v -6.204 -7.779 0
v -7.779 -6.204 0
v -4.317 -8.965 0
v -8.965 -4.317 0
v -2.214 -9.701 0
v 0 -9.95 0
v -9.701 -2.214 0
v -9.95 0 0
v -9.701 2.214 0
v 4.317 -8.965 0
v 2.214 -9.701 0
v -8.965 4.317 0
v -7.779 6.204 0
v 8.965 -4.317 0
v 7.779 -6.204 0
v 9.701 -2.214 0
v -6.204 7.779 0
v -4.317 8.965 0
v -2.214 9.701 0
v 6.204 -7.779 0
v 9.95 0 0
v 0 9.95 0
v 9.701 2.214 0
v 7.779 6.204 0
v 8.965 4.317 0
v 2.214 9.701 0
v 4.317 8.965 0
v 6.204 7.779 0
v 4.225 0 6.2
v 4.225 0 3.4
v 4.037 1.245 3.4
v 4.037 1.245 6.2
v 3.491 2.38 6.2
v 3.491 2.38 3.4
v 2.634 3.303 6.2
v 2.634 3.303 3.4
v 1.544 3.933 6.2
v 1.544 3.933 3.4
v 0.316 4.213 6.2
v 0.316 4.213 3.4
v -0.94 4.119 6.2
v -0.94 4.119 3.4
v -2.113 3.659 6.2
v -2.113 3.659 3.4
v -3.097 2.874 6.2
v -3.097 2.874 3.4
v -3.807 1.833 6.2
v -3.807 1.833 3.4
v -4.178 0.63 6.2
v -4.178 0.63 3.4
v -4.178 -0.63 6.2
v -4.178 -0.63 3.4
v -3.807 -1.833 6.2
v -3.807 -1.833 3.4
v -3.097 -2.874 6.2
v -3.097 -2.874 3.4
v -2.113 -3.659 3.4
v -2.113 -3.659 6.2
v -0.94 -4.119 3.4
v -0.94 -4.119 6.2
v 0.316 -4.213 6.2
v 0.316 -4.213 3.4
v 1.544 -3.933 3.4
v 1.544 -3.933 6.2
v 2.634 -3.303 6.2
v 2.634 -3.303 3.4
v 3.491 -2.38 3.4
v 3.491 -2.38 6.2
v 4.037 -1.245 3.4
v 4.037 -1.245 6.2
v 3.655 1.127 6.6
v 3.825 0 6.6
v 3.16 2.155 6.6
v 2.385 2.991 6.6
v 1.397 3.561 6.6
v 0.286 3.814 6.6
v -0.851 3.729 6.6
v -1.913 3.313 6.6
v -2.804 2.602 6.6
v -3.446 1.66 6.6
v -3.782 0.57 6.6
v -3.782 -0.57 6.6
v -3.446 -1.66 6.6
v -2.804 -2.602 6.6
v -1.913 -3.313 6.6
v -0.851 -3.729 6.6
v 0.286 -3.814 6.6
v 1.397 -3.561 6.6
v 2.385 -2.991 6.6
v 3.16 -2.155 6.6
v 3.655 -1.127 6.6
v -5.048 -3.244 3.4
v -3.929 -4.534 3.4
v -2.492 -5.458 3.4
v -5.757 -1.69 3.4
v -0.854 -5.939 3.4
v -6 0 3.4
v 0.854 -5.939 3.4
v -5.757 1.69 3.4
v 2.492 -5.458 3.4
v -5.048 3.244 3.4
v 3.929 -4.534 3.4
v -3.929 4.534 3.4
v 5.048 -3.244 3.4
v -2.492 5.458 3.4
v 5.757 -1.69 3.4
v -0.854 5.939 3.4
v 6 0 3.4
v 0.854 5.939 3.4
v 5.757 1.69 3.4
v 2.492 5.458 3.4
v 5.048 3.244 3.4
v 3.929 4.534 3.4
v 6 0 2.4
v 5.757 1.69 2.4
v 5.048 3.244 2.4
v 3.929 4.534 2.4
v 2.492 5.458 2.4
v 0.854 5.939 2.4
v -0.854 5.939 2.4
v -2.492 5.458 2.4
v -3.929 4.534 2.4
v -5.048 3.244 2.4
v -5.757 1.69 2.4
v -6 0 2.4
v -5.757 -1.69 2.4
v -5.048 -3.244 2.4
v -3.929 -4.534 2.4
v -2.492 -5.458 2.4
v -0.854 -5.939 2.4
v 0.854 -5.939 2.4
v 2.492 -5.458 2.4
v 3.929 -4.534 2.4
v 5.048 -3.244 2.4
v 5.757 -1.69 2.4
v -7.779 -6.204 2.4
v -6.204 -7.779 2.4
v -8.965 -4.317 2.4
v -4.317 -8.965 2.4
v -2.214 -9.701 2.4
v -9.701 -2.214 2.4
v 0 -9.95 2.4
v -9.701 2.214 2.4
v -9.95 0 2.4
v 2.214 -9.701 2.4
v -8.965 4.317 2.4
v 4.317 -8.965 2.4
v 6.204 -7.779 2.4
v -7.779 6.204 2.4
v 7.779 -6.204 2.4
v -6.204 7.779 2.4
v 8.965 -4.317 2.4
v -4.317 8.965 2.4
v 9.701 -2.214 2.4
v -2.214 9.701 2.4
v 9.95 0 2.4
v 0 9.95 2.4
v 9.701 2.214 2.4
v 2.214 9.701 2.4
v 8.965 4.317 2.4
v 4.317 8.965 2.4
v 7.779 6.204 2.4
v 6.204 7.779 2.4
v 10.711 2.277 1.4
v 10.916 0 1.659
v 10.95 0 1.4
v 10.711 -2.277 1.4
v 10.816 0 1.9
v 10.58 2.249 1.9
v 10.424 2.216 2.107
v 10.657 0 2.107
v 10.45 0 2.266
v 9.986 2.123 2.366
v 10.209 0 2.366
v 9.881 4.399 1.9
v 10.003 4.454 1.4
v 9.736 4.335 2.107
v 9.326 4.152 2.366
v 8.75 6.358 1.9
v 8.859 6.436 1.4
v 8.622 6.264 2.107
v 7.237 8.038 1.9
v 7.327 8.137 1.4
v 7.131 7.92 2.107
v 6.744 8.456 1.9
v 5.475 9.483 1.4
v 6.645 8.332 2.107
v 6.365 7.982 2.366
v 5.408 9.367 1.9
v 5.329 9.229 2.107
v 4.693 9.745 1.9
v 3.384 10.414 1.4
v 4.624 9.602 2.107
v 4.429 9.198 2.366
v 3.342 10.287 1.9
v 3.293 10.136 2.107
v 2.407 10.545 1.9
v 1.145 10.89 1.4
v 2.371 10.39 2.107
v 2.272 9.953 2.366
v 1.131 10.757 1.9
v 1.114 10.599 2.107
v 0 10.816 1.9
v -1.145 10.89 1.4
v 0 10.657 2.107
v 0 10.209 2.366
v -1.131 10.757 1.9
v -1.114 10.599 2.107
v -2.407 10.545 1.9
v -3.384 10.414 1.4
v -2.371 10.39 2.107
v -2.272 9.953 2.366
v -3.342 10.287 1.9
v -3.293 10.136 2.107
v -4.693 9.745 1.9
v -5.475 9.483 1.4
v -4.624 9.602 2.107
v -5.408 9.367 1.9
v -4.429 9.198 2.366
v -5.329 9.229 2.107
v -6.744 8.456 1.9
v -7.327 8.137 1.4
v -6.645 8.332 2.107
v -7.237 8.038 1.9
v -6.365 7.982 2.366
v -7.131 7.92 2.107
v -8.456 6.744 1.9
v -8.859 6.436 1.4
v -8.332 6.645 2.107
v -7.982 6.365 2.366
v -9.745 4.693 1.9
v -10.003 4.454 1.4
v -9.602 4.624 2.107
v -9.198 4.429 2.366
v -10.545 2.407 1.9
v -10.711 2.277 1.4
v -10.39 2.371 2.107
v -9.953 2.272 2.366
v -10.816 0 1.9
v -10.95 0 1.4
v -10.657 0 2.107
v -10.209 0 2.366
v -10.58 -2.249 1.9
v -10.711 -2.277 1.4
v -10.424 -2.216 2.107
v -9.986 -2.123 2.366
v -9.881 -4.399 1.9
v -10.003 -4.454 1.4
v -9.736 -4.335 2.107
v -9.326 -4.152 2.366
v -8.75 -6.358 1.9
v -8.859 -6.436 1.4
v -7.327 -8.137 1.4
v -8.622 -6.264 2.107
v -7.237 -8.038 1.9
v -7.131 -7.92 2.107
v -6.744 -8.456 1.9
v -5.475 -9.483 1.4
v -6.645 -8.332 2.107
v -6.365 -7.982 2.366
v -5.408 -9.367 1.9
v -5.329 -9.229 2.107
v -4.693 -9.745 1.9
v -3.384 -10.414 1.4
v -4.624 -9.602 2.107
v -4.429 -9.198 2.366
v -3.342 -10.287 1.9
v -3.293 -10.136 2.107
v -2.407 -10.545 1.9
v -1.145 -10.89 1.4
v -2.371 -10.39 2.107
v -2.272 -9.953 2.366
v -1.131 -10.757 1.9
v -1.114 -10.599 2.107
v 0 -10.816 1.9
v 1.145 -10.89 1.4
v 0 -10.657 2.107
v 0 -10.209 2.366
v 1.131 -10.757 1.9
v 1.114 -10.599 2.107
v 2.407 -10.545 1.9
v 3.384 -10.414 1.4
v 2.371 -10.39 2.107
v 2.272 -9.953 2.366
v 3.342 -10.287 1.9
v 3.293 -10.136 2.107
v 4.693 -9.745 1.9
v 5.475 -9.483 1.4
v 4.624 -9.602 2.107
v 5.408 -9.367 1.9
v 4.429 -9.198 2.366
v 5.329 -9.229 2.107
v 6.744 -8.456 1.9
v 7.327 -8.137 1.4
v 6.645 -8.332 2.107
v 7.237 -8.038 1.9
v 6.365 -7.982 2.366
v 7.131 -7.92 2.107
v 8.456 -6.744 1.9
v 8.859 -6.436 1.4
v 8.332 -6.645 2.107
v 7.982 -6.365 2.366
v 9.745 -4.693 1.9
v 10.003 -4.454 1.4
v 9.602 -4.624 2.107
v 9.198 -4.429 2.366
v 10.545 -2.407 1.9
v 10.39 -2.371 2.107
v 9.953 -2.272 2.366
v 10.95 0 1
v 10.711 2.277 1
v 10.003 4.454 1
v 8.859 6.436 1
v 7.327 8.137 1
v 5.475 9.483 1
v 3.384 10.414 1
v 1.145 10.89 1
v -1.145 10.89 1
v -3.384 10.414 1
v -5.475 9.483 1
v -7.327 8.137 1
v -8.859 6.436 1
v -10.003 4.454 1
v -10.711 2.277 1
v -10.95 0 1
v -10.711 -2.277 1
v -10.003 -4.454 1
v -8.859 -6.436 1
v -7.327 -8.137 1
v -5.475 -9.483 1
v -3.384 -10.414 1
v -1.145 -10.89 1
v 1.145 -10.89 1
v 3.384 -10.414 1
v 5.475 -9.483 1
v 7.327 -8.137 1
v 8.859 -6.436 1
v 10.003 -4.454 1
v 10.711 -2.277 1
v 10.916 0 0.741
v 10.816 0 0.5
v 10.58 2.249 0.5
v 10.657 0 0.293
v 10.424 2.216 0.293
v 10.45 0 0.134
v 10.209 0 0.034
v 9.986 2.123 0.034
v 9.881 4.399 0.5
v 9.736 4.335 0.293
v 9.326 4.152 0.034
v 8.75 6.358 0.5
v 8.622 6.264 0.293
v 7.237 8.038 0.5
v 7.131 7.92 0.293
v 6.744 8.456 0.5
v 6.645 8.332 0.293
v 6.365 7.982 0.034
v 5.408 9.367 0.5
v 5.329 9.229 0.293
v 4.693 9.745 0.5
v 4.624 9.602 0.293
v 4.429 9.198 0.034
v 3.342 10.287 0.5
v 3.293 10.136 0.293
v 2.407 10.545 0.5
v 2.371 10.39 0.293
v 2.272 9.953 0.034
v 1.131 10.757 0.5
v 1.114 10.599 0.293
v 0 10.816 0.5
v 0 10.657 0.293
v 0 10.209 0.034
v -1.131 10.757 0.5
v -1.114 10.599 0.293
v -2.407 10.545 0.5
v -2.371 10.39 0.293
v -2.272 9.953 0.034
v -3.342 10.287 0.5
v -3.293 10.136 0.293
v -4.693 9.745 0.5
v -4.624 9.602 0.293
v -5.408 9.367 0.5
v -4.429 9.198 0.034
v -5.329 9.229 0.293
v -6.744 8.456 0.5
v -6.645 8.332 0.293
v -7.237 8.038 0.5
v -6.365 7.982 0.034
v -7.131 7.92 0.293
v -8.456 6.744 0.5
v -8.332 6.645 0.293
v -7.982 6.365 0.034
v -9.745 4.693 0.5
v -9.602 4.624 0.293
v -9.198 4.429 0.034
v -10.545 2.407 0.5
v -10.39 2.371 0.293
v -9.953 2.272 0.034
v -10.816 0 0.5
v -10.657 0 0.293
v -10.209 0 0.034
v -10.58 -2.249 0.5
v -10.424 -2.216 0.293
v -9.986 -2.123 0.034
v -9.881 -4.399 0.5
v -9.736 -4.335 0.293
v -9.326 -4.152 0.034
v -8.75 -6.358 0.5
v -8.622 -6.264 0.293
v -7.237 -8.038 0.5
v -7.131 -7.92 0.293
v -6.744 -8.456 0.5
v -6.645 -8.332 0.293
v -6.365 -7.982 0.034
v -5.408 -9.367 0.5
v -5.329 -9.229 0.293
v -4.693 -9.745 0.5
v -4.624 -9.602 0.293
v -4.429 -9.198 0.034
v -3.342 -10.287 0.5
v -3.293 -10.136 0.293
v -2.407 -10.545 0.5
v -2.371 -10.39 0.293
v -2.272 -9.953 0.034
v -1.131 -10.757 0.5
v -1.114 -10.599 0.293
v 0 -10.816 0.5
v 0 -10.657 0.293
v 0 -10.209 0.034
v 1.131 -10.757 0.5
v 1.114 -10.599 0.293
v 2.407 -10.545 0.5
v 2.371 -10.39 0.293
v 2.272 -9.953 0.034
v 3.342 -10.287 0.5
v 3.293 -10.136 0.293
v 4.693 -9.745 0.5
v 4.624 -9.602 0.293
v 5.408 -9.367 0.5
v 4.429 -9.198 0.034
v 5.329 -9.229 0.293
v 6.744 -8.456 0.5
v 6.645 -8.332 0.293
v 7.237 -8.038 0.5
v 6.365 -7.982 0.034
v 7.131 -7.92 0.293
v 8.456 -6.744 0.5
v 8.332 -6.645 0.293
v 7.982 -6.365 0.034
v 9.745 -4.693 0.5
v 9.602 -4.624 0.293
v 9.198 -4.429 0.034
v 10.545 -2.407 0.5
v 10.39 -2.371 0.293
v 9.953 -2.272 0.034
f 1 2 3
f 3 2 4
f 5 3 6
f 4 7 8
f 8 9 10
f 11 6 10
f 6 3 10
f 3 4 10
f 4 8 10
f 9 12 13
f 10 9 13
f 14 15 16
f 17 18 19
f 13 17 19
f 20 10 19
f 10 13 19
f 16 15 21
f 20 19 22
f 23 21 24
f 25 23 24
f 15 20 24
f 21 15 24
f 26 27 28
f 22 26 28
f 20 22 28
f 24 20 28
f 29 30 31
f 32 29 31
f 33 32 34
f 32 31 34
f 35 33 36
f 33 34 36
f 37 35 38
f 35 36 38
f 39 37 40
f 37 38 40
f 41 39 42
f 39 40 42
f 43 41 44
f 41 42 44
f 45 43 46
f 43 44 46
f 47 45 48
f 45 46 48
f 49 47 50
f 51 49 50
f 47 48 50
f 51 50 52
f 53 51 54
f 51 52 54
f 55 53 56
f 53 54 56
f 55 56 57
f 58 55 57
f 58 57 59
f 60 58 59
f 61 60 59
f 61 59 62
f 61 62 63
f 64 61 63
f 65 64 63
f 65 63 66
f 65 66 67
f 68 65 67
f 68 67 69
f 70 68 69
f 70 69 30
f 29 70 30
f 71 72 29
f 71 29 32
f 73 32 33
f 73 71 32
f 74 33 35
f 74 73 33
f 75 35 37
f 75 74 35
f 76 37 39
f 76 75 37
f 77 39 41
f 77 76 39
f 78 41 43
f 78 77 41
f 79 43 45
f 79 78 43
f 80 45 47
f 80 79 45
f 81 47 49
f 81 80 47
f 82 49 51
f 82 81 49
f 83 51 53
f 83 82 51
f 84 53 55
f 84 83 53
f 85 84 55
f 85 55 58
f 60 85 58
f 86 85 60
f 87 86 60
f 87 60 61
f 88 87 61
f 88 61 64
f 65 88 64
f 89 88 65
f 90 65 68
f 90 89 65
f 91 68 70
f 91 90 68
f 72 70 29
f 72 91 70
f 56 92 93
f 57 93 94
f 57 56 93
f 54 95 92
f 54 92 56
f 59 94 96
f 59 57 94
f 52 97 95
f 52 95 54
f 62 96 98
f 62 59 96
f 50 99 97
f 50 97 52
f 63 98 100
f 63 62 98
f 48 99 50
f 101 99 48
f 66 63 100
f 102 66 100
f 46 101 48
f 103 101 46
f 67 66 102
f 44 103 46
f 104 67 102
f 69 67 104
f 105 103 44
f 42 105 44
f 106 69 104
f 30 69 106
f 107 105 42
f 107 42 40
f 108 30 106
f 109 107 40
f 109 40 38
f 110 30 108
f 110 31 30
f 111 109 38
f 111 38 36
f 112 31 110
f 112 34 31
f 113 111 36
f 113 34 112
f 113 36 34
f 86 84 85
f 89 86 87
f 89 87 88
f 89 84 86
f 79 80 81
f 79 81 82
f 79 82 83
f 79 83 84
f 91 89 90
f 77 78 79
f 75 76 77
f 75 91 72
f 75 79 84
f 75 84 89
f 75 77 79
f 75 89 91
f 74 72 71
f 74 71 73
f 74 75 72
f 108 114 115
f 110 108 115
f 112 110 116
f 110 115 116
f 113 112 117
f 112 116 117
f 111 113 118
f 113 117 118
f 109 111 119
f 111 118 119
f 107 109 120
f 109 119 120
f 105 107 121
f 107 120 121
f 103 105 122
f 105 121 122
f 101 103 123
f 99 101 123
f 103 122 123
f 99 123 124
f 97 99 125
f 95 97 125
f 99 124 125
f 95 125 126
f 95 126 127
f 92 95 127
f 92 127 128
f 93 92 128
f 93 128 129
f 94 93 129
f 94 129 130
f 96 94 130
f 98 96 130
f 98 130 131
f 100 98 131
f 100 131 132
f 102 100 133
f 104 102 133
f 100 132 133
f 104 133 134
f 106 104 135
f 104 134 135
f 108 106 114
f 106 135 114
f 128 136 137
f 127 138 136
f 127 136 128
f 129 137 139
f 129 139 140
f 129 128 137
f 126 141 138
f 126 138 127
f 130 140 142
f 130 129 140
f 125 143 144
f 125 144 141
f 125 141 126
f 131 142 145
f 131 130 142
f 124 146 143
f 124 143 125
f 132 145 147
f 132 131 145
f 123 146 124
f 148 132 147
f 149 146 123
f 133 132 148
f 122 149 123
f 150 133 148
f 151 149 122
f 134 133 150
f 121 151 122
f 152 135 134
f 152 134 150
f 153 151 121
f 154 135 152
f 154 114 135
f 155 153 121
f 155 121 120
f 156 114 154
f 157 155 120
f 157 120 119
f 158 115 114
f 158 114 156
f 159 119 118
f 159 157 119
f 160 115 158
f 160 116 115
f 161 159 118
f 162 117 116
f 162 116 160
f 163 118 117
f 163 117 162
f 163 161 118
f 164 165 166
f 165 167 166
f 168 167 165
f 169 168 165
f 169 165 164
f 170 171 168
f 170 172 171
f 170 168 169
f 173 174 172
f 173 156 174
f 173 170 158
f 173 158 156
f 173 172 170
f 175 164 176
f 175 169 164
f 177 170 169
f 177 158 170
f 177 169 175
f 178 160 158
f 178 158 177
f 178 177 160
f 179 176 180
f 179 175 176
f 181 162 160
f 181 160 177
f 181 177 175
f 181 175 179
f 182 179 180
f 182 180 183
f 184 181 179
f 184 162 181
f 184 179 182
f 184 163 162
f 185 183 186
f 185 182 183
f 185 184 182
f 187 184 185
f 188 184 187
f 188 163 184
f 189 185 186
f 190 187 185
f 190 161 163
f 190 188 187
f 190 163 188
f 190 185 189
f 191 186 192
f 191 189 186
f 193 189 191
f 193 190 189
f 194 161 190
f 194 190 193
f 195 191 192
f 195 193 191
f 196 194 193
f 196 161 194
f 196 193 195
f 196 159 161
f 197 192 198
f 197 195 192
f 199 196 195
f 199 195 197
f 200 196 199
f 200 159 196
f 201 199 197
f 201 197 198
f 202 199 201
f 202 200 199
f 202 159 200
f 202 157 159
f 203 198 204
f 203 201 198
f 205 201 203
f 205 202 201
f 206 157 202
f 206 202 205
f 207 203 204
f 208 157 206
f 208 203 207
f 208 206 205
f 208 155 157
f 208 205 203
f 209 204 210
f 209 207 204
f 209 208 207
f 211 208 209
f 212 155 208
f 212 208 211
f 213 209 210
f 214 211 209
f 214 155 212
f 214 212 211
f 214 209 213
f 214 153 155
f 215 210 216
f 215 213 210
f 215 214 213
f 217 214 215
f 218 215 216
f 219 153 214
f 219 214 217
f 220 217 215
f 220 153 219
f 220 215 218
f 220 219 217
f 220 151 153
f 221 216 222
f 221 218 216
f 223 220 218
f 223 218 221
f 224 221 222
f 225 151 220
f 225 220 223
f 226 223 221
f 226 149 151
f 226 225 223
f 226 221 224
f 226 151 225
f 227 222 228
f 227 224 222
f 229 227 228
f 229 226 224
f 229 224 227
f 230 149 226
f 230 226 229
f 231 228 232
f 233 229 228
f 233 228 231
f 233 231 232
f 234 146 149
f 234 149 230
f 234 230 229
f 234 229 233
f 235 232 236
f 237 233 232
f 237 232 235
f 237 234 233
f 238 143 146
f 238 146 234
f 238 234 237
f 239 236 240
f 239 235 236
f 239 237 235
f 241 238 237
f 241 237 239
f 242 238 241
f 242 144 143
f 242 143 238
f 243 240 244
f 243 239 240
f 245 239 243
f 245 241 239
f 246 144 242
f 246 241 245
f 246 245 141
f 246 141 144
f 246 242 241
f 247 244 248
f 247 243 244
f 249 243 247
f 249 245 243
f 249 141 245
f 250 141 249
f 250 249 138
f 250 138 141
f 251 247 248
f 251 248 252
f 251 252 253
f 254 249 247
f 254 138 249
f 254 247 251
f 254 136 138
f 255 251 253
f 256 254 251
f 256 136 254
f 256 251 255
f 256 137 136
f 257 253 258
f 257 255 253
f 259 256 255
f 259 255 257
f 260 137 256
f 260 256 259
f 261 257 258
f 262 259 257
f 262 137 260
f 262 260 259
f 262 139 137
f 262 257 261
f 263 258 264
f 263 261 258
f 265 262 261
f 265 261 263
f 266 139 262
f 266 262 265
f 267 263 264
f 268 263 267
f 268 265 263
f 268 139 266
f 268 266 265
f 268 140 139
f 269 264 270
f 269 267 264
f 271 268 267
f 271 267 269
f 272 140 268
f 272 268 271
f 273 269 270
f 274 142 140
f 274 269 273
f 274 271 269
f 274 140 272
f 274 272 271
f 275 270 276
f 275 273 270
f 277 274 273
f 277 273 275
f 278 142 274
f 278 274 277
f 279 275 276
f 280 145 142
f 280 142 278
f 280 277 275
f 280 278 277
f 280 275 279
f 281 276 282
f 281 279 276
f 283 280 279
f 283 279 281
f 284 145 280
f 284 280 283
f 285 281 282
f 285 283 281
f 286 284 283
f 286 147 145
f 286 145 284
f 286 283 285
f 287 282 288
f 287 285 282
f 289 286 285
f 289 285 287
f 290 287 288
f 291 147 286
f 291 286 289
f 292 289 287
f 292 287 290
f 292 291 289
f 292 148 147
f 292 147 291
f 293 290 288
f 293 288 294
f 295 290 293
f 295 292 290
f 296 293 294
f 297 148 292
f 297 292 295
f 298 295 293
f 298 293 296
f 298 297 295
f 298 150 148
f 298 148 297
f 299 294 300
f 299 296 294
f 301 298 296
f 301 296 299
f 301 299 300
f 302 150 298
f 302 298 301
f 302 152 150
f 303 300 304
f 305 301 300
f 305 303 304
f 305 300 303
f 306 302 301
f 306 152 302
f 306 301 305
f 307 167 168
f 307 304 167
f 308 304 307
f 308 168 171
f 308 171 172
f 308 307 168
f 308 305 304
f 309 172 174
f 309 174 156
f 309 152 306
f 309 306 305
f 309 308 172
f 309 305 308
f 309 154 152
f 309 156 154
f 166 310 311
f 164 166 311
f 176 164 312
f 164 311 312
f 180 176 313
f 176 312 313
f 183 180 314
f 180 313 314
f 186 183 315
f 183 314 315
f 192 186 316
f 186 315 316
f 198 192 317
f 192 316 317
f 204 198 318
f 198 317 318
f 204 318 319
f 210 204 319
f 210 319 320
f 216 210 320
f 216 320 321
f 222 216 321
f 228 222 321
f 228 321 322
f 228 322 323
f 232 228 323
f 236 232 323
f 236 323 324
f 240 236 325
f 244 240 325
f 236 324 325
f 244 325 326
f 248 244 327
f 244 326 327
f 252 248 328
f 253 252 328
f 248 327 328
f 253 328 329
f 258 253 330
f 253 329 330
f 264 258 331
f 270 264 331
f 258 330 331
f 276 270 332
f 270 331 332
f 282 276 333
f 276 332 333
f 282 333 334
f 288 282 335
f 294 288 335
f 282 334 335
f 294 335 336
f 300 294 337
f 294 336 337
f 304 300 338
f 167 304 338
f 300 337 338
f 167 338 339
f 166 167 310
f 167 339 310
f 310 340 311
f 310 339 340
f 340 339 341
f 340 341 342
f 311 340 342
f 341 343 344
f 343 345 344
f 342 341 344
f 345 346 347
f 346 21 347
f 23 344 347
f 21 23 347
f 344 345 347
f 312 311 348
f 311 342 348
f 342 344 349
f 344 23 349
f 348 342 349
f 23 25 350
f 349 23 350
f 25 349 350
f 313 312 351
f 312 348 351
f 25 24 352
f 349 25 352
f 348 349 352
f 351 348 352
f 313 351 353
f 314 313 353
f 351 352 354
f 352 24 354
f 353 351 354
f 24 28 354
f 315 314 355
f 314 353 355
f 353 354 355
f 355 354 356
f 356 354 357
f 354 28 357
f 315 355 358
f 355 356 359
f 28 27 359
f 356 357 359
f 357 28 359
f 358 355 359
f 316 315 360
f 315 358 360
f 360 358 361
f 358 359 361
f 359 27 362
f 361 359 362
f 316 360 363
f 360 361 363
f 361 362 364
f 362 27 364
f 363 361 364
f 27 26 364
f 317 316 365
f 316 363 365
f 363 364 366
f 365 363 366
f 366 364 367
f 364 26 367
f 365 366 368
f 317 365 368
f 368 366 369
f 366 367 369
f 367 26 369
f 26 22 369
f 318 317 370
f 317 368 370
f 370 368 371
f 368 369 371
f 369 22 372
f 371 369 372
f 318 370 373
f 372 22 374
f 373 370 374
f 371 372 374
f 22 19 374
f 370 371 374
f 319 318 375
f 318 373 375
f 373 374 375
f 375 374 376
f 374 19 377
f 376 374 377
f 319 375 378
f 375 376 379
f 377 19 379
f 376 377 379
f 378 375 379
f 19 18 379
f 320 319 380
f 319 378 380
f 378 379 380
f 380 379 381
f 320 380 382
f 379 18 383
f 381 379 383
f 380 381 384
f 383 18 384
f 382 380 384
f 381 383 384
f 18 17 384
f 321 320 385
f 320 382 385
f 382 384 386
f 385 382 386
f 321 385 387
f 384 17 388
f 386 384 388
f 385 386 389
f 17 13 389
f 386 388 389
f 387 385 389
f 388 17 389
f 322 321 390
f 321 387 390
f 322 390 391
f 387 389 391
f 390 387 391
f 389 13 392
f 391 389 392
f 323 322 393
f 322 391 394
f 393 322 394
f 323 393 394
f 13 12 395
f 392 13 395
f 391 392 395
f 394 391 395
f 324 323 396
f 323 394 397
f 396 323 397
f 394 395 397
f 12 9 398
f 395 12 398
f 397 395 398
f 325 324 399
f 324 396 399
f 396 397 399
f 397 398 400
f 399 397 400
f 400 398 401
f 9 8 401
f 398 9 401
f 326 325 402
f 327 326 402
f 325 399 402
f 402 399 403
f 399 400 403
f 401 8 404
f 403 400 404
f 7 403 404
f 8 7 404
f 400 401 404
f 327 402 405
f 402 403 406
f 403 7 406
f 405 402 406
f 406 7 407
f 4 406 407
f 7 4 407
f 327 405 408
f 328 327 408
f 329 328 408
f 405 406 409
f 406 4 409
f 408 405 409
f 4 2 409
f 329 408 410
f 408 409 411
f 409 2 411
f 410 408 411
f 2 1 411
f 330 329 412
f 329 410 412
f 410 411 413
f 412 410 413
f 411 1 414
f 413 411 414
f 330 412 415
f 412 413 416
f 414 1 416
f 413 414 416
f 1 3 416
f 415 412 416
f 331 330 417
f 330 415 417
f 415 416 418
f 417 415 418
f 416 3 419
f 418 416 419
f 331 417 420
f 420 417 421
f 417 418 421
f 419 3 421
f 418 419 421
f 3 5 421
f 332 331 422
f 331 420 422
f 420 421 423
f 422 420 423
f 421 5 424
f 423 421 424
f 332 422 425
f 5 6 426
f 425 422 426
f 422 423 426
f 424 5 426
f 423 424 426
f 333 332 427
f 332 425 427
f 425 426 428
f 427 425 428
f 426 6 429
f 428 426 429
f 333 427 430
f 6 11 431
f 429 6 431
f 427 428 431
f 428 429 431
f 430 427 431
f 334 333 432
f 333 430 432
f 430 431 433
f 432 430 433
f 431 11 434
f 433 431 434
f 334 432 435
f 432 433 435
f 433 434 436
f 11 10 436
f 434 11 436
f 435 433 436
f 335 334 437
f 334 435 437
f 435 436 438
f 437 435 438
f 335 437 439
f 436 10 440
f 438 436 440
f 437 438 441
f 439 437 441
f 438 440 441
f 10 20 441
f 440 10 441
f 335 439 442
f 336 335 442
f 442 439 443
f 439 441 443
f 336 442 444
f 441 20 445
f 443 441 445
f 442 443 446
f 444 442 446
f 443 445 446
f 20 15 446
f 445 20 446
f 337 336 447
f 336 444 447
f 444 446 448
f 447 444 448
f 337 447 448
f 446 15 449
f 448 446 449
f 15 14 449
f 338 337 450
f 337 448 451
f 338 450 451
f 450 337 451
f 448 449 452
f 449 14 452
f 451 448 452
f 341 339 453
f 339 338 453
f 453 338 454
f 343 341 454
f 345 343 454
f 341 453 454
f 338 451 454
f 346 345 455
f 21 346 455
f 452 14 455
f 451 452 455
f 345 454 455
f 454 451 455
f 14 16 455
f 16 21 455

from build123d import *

# Parameters (mm, degrees)
F0_R     = 10.95
F1_DEPTH = 2.4
F2_R     = 4.225
F3_DEPTH = 4.2
F4_R     = 1
F5_R     = 6
F6_DEPTH = 1
F7_R     = 1
F8_SIZE  = 0.4


with BuildPart() as f1:
    # F0 (on Top) → F1 (new body)
    with BuildSketch(Plane.XY):
        Circle(F0_R)
    extrude(amount=F1_DEPTH)

    # F2 (on face) → F3 (join)
    with BuildSketch(Plane.XY.offset(2.4)):
        Circle(F2_R)
    extrude(amount=F3_DEPTH)

    # F4
    f4_edges = [f1.edges().sort_by_distance(p)[0] for p in [
        (-10.95, 0, 2.4),
    ]]
    fillet(f4_edges, radius=F4_R)

    # F5 (on face) → F6 (join)
    with BuildSketch(Plane.XY.offset(2.4)):
        Circle(F5_R)
    extrude(amount=F6_DEPTH)

    # F7
    f7_edges = [f1.edges().sort_by_distance(p)[0] for p in [
        (-10.95, 0, 0),
    ]]
    fillet(f7_edges, radius=F7_R)

    # F8
    f8_edges = [f1.edges().sort_by_distance(p)[0] for p in [
        (-4.225, 0, 6.6),
    ]]
    chamfer(f8_edges, length=F8_SIZE)


solid = f1.part
